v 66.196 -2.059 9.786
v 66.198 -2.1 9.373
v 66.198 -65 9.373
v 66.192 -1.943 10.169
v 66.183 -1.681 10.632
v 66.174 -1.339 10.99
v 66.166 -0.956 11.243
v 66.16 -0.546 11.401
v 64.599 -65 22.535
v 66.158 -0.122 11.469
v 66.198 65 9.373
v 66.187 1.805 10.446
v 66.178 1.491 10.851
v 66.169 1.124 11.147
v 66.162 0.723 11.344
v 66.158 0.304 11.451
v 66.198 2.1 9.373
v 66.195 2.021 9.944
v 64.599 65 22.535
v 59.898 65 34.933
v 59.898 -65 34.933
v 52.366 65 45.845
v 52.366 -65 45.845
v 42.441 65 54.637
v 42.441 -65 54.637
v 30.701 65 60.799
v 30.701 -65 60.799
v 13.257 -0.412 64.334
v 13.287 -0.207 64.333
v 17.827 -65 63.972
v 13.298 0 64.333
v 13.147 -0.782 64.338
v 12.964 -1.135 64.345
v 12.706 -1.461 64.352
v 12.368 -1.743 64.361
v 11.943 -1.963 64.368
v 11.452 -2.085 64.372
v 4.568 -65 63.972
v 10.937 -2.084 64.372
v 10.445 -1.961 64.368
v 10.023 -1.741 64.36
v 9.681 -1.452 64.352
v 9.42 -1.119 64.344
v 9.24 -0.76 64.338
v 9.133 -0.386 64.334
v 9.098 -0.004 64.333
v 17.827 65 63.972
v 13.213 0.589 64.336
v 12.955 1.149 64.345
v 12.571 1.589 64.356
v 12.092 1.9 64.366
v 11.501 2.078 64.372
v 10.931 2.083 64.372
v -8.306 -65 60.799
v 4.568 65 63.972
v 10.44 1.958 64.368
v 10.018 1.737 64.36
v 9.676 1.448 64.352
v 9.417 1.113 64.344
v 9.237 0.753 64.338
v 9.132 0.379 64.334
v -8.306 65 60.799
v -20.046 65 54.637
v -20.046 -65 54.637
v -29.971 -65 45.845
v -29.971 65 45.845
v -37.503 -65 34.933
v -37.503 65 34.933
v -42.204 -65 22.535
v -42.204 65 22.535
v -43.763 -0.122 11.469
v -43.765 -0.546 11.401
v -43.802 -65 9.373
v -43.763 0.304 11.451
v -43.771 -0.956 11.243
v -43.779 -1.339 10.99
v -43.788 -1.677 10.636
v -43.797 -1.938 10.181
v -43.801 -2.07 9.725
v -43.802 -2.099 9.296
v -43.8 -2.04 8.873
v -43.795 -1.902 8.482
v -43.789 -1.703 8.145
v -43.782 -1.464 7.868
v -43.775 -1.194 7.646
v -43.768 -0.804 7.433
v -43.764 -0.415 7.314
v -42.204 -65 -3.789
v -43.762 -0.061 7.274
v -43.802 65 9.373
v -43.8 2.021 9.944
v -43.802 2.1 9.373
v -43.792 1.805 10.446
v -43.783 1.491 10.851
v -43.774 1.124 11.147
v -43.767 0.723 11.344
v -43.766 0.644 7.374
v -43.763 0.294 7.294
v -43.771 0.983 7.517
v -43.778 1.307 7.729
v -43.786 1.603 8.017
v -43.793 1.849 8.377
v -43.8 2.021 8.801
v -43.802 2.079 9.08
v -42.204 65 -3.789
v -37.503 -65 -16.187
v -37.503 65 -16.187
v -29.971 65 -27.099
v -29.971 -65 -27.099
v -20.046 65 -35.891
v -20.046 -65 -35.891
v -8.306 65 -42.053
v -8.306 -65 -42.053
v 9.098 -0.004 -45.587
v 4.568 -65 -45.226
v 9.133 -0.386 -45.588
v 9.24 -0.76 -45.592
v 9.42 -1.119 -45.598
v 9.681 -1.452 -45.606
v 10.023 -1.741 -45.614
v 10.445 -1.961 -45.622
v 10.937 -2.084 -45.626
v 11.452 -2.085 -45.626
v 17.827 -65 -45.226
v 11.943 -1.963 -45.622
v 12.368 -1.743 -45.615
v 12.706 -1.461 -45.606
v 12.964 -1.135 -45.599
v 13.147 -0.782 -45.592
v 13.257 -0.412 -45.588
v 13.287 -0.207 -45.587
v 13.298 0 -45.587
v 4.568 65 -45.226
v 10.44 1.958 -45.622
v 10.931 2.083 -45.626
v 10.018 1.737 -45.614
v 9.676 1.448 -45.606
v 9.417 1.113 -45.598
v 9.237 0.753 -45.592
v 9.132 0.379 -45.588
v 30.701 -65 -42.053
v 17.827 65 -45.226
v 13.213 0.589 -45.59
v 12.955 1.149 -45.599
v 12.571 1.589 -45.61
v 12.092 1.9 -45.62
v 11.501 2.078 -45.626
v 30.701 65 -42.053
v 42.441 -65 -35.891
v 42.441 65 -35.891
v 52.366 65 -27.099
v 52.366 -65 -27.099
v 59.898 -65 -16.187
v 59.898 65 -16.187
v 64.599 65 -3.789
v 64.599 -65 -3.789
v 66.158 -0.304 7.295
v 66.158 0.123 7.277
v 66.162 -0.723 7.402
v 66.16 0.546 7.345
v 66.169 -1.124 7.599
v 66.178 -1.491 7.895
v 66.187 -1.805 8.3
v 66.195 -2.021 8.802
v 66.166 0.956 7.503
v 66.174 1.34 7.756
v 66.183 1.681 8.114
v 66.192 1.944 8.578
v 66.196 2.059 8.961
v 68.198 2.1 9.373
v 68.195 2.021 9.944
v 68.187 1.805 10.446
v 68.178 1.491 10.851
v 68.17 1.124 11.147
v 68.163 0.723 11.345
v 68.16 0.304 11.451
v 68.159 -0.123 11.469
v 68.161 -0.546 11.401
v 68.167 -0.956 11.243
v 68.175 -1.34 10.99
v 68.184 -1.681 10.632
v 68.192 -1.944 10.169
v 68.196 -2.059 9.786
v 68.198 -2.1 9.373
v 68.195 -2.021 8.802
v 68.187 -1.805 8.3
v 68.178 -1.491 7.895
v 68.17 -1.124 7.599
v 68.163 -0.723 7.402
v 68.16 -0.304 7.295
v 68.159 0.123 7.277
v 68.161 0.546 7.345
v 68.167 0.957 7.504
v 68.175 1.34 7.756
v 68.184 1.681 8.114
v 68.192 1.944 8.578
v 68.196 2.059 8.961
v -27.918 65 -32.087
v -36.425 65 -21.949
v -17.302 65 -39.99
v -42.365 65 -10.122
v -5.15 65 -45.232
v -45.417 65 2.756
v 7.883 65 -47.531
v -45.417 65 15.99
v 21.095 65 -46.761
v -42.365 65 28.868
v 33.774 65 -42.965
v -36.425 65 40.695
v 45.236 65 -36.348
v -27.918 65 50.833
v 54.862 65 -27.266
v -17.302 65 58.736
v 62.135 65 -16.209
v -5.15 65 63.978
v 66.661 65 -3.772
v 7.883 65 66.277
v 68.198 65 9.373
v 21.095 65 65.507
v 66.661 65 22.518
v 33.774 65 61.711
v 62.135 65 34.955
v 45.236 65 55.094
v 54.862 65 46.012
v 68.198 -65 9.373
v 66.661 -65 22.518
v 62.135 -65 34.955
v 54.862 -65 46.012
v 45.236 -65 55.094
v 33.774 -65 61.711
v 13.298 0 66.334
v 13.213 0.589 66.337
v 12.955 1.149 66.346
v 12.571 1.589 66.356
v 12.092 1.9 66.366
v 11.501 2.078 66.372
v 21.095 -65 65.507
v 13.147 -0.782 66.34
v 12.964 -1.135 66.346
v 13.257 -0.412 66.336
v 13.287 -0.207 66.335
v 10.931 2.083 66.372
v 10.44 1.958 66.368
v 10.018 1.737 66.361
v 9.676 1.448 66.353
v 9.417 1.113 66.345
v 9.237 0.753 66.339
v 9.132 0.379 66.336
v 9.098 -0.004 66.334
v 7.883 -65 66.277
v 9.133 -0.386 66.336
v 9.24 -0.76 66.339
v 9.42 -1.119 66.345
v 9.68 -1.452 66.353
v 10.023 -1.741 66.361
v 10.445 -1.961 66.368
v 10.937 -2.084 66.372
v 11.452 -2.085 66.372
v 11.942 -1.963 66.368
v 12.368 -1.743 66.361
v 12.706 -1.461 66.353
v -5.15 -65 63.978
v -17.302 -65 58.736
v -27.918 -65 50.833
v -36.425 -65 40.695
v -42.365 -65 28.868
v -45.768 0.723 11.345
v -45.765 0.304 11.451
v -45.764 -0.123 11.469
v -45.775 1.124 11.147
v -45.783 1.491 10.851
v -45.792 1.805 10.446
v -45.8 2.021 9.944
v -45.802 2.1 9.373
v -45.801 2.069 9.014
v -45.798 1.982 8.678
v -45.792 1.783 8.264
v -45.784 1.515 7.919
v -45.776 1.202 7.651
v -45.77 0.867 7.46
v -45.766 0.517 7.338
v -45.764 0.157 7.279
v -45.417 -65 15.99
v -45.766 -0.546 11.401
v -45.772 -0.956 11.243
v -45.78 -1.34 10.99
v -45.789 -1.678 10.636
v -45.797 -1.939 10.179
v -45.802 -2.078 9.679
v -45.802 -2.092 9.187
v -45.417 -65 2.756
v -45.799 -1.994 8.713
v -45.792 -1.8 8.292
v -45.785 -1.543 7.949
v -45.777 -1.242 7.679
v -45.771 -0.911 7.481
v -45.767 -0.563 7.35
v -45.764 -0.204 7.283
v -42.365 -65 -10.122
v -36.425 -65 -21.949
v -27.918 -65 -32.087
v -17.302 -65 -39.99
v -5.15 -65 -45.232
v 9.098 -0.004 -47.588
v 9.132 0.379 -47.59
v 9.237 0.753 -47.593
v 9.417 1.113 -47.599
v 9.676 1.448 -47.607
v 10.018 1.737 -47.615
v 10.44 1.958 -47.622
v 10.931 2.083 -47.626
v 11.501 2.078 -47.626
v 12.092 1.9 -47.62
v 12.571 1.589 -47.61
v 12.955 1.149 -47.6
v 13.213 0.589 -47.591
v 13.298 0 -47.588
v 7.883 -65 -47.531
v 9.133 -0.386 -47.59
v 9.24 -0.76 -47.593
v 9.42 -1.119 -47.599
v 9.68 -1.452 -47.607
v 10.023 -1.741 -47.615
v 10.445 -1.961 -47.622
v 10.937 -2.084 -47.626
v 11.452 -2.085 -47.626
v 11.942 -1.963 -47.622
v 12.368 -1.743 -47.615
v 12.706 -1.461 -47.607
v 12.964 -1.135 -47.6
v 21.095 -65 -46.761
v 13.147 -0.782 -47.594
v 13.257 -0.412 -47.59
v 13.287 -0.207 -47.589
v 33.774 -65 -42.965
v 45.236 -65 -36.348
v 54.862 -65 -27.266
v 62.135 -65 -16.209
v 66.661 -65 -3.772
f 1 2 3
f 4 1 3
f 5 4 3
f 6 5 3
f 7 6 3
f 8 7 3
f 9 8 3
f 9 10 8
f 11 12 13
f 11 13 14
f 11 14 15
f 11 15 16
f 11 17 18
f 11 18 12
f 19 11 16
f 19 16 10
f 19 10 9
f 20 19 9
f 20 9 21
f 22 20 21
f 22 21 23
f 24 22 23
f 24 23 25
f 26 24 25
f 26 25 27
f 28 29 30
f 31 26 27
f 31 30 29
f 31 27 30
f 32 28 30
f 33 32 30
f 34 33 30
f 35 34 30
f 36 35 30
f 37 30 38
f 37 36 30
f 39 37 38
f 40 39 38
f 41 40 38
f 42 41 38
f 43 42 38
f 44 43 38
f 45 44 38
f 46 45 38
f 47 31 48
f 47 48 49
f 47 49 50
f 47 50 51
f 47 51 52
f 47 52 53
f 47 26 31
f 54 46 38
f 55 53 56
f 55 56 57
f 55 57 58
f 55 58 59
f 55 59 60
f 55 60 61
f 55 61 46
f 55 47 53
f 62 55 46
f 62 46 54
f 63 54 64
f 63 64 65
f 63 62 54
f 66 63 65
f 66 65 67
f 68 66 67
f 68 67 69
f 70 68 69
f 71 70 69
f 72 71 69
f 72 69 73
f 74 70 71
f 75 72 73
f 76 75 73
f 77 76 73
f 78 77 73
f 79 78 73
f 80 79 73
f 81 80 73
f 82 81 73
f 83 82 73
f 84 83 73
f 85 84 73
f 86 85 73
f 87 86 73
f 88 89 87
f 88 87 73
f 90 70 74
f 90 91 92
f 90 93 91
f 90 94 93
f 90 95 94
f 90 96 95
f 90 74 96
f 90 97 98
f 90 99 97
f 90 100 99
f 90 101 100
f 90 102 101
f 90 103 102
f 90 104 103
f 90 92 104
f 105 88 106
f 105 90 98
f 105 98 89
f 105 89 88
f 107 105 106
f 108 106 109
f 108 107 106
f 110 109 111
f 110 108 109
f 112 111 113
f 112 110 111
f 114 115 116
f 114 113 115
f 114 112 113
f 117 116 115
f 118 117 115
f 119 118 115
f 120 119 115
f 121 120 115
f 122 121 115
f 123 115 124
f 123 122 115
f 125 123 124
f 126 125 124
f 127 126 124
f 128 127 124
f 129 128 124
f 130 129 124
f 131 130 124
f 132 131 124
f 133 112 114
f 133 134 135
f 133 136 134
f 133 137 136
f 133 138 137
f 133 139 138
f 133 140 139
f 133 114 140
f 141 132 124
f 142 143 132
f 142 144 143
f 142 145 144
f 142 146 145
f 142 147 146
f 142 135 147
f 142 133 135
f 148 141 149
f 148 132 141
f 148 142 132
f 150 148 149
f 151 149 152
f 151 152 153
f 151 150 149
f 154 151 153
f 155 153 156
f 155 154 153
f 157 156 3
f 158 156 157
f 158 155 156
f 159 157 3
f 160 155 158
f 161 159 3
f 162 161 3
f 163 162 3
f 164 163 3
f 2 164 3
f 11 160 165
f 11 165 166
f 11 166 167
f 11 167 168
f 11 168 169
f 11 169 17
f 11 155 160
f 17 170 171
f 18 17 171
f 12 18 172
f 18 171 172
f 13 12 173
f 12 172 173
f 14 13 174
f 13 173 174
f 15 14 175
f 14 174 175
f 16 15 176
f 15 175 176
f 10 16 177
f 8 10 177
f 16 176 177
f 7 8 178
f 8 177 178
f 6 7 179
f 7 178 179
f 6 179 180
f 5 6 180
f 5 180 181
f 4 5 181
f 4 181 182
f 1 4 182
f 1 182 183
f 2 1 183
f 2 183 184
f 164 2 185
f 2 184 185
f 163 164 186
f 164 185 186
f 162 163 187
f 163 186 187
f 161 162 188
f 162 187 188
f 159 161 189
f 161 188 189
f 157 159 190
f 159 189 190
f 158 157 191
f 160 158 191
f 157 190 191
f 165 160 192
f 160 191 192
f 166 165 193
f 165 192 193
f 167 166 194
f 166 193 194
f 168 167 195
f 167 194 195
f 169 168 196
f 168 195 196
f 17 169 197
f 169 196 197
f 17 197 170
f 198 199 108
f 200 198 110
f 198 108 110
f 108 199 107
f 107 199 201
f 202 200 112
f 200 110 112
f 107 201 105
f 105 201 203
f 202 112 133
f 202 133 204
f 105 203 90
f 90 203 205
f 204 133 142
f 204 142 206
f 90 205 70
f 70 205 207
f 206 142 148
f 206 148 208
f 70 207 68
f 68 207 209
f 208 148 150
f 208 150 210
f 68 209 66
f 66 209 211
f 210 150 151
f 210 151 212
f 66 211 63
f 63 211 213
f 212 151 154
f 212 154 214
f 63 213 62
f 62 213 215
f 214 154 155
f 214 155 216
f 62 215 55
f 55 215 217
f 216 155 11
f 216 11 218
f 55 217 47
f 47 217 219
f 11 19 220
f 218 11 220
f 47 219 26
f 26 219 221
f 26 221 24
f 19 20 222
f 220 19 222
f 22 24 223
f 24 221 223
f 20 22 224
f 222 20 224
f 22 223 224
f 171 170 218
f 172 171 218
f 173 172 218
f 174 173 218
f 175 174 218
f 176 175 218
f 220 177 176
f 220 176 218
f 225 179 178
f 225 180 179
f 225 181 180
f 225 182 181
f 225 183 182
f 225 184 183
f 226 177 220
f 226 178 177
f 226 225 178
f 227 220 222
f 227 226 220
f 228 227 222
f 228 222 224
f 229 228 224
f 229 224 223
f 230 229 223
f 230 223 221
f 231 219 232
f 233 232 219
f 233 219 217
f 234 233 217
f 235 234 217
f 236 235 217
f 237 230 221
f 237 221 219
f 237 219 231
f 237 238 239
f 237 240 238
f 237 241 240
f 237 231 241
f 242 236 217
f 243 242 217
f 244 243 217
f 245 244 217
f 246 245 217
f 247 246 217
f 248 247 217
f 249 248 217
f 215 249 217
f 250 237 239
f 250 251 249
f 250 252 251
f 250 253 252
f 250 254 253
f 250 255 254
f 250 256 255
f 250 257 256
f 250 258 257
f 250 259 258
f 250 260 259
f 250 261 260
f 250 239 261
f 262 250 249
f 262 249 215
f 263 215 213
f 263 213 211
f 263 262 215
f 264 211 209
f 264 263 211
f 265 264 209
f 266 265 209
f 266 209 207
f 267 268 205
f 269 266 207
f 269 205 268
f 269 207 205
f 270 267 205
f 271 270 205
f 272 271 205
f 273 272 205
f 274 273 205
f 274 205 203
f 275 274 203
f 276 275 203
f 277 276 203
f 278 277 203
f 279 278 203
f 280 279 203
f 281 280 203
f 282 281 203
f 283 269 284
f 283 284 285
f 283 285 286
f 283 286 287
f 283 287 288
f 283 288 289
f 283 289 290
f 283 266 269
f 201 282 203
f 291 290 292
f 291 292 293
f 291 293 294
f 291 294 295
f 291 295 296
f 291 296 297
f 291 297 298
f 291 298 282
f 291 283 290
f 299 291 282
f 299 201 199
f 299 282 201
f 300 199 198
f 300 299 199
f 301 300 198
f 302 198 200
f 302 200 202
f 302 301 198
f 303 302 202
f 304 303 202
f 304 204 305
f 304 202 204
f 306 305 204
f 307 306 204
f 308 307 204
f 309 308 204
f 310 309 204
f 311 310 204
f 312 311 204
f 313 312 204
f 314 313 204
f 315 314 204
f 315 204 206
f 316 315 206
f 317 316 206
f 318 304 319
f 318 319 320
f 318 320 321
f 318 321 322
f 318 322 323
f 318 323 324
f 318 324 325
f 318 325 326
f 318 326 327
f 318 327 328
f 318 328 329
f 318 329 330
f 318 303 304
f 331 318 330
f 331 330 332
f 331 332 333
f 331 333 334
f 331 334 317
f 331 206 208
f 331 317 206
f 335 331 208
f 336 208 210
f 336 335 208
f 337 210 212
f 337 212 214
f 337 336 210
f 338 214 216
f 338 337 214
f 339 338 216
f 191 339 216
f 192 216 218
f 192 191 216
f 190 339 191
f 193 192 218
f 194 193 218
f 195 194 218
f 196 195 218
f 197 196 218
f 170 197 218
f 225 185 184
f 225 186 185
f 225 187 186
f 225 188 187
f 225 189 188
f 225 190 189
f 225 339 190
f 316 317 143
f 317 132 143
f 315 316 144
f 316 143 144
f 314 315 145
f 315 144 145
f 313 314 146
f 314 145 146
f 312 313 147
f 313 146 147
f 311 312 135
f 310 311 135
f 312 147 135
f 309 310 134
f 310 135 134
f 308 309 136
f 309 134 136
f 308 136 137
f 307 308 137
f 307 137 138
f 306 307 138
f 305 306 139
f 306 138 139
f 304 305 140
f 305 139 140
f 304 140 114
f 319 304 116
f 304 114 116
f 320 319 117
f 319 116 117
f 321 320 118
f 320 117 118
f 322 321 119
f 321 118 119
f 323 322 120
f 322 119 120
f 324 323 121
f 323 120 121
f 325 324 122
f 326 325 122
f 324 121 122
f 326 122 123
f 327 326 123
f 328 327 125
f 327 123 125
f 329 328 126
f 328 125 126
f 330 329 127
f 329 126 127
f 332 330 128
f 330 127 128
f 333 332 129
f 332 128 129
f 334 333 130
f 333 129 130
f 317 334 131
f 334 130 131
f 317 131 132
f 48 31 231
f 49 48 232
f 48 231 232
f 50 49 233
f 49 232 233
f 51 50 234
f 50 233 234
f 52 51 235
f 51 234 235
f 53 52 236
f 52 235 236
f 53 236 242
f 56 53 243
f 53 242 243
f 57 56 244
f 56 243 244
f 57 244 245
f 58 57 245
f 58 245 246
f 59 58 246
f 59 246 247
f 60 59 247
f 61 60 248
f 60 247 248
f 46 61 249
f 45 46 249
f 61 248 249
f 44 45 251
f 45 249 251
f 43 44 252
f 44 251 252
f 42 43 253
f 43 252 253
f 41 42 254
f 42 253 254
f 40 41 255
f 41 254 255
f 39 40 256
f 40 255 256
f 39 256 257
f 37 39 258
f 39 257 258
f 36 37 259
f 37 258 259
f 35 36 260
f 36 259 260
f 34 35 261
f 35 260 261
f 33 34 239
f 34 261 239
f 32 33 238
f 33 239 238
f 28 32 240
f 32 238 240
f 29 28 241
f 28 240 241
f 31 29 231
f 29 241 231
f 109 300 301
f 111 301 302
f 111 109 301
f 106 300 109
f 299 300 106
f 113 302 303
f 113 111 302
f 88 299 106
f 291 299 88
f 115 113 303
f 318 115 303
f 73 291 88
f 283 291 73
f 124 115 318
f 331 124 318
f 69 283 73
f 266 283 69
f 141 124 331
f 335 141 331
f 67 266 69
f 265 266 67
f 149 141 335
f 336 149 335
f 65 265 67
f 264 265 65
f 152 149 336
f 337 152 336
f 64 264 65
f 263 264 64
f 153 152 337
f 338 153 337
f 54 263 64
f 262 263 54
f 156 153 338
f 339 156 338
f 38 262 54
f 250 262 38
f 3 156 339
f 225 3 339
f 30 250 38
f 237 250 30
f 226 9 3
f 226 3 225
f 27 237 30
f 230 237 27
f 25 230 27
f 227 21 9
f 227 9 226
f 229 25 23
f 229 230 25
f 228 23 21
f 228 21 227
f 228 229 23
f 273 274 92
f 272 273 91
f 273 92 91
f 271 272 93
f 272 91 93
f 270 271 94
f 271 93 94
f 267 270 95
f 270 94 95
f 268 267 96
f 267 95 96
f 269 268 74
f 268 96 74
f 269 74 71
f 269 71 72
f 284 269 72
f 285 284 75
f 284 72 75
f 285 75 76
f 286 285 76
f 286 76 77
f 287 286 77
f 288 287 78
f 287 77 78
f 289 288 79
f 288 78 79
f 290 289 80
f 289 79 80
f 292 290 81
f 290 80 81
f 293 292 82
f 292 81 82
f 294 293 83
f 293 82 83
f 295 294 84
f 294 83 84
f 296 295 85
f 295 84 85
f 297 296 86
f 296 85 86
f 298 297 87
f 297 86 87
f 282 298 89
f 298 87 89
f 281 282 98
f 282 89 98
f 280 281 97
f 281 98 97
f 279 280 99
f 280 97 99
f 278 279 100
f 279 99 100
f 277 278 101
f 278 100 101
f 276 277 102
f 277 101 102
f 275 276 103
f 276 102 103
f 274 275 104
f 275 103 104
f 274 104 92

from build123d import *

# Parameters (mm, degrees)
F0_R     = 57
F0_R_2   = 55
F1_DEPTH = 65
F3_R     = 2.1
F4_DEPTH = 70
F5_R     = 2.1
F6_DEPTH = 100


with BuildPart() as f1:
    # F0 (on Front) → F1 (new body, symmetric)
    with BuildSketch(Plane.XZ):
        with Locations((11.197514832, 9.3730366789)):
            Circle(F0_R)
        with Locations((11.197514832, 9.3730366789)):
            Circle(F0_R_2, mode=Mode.SUBTRACT)
    extrude(amount=F1_DEPTH, both=True)

    # F3 (on plane+point) → F4 (cut, symmetric)
    with BuildSketch(Plane.YZ.offset(11.197514832)):
        with Locations((0, 9.3730366789)):
            Circle(F3_R)
    extrude(amount=F4_DEPTH, both=True, mode=Mode.SUBTRACT)

    # F5 (on Top) → F6 (cut, symmetric)
    with BuildSketch(Plane.XY):
        with Locations((11.197514832, 0)):
            Circle(F5_R)
    extrude(amount=F6_DEPTH, both=True, mode=Mode.SUBTRACT)


solid = f1.part
